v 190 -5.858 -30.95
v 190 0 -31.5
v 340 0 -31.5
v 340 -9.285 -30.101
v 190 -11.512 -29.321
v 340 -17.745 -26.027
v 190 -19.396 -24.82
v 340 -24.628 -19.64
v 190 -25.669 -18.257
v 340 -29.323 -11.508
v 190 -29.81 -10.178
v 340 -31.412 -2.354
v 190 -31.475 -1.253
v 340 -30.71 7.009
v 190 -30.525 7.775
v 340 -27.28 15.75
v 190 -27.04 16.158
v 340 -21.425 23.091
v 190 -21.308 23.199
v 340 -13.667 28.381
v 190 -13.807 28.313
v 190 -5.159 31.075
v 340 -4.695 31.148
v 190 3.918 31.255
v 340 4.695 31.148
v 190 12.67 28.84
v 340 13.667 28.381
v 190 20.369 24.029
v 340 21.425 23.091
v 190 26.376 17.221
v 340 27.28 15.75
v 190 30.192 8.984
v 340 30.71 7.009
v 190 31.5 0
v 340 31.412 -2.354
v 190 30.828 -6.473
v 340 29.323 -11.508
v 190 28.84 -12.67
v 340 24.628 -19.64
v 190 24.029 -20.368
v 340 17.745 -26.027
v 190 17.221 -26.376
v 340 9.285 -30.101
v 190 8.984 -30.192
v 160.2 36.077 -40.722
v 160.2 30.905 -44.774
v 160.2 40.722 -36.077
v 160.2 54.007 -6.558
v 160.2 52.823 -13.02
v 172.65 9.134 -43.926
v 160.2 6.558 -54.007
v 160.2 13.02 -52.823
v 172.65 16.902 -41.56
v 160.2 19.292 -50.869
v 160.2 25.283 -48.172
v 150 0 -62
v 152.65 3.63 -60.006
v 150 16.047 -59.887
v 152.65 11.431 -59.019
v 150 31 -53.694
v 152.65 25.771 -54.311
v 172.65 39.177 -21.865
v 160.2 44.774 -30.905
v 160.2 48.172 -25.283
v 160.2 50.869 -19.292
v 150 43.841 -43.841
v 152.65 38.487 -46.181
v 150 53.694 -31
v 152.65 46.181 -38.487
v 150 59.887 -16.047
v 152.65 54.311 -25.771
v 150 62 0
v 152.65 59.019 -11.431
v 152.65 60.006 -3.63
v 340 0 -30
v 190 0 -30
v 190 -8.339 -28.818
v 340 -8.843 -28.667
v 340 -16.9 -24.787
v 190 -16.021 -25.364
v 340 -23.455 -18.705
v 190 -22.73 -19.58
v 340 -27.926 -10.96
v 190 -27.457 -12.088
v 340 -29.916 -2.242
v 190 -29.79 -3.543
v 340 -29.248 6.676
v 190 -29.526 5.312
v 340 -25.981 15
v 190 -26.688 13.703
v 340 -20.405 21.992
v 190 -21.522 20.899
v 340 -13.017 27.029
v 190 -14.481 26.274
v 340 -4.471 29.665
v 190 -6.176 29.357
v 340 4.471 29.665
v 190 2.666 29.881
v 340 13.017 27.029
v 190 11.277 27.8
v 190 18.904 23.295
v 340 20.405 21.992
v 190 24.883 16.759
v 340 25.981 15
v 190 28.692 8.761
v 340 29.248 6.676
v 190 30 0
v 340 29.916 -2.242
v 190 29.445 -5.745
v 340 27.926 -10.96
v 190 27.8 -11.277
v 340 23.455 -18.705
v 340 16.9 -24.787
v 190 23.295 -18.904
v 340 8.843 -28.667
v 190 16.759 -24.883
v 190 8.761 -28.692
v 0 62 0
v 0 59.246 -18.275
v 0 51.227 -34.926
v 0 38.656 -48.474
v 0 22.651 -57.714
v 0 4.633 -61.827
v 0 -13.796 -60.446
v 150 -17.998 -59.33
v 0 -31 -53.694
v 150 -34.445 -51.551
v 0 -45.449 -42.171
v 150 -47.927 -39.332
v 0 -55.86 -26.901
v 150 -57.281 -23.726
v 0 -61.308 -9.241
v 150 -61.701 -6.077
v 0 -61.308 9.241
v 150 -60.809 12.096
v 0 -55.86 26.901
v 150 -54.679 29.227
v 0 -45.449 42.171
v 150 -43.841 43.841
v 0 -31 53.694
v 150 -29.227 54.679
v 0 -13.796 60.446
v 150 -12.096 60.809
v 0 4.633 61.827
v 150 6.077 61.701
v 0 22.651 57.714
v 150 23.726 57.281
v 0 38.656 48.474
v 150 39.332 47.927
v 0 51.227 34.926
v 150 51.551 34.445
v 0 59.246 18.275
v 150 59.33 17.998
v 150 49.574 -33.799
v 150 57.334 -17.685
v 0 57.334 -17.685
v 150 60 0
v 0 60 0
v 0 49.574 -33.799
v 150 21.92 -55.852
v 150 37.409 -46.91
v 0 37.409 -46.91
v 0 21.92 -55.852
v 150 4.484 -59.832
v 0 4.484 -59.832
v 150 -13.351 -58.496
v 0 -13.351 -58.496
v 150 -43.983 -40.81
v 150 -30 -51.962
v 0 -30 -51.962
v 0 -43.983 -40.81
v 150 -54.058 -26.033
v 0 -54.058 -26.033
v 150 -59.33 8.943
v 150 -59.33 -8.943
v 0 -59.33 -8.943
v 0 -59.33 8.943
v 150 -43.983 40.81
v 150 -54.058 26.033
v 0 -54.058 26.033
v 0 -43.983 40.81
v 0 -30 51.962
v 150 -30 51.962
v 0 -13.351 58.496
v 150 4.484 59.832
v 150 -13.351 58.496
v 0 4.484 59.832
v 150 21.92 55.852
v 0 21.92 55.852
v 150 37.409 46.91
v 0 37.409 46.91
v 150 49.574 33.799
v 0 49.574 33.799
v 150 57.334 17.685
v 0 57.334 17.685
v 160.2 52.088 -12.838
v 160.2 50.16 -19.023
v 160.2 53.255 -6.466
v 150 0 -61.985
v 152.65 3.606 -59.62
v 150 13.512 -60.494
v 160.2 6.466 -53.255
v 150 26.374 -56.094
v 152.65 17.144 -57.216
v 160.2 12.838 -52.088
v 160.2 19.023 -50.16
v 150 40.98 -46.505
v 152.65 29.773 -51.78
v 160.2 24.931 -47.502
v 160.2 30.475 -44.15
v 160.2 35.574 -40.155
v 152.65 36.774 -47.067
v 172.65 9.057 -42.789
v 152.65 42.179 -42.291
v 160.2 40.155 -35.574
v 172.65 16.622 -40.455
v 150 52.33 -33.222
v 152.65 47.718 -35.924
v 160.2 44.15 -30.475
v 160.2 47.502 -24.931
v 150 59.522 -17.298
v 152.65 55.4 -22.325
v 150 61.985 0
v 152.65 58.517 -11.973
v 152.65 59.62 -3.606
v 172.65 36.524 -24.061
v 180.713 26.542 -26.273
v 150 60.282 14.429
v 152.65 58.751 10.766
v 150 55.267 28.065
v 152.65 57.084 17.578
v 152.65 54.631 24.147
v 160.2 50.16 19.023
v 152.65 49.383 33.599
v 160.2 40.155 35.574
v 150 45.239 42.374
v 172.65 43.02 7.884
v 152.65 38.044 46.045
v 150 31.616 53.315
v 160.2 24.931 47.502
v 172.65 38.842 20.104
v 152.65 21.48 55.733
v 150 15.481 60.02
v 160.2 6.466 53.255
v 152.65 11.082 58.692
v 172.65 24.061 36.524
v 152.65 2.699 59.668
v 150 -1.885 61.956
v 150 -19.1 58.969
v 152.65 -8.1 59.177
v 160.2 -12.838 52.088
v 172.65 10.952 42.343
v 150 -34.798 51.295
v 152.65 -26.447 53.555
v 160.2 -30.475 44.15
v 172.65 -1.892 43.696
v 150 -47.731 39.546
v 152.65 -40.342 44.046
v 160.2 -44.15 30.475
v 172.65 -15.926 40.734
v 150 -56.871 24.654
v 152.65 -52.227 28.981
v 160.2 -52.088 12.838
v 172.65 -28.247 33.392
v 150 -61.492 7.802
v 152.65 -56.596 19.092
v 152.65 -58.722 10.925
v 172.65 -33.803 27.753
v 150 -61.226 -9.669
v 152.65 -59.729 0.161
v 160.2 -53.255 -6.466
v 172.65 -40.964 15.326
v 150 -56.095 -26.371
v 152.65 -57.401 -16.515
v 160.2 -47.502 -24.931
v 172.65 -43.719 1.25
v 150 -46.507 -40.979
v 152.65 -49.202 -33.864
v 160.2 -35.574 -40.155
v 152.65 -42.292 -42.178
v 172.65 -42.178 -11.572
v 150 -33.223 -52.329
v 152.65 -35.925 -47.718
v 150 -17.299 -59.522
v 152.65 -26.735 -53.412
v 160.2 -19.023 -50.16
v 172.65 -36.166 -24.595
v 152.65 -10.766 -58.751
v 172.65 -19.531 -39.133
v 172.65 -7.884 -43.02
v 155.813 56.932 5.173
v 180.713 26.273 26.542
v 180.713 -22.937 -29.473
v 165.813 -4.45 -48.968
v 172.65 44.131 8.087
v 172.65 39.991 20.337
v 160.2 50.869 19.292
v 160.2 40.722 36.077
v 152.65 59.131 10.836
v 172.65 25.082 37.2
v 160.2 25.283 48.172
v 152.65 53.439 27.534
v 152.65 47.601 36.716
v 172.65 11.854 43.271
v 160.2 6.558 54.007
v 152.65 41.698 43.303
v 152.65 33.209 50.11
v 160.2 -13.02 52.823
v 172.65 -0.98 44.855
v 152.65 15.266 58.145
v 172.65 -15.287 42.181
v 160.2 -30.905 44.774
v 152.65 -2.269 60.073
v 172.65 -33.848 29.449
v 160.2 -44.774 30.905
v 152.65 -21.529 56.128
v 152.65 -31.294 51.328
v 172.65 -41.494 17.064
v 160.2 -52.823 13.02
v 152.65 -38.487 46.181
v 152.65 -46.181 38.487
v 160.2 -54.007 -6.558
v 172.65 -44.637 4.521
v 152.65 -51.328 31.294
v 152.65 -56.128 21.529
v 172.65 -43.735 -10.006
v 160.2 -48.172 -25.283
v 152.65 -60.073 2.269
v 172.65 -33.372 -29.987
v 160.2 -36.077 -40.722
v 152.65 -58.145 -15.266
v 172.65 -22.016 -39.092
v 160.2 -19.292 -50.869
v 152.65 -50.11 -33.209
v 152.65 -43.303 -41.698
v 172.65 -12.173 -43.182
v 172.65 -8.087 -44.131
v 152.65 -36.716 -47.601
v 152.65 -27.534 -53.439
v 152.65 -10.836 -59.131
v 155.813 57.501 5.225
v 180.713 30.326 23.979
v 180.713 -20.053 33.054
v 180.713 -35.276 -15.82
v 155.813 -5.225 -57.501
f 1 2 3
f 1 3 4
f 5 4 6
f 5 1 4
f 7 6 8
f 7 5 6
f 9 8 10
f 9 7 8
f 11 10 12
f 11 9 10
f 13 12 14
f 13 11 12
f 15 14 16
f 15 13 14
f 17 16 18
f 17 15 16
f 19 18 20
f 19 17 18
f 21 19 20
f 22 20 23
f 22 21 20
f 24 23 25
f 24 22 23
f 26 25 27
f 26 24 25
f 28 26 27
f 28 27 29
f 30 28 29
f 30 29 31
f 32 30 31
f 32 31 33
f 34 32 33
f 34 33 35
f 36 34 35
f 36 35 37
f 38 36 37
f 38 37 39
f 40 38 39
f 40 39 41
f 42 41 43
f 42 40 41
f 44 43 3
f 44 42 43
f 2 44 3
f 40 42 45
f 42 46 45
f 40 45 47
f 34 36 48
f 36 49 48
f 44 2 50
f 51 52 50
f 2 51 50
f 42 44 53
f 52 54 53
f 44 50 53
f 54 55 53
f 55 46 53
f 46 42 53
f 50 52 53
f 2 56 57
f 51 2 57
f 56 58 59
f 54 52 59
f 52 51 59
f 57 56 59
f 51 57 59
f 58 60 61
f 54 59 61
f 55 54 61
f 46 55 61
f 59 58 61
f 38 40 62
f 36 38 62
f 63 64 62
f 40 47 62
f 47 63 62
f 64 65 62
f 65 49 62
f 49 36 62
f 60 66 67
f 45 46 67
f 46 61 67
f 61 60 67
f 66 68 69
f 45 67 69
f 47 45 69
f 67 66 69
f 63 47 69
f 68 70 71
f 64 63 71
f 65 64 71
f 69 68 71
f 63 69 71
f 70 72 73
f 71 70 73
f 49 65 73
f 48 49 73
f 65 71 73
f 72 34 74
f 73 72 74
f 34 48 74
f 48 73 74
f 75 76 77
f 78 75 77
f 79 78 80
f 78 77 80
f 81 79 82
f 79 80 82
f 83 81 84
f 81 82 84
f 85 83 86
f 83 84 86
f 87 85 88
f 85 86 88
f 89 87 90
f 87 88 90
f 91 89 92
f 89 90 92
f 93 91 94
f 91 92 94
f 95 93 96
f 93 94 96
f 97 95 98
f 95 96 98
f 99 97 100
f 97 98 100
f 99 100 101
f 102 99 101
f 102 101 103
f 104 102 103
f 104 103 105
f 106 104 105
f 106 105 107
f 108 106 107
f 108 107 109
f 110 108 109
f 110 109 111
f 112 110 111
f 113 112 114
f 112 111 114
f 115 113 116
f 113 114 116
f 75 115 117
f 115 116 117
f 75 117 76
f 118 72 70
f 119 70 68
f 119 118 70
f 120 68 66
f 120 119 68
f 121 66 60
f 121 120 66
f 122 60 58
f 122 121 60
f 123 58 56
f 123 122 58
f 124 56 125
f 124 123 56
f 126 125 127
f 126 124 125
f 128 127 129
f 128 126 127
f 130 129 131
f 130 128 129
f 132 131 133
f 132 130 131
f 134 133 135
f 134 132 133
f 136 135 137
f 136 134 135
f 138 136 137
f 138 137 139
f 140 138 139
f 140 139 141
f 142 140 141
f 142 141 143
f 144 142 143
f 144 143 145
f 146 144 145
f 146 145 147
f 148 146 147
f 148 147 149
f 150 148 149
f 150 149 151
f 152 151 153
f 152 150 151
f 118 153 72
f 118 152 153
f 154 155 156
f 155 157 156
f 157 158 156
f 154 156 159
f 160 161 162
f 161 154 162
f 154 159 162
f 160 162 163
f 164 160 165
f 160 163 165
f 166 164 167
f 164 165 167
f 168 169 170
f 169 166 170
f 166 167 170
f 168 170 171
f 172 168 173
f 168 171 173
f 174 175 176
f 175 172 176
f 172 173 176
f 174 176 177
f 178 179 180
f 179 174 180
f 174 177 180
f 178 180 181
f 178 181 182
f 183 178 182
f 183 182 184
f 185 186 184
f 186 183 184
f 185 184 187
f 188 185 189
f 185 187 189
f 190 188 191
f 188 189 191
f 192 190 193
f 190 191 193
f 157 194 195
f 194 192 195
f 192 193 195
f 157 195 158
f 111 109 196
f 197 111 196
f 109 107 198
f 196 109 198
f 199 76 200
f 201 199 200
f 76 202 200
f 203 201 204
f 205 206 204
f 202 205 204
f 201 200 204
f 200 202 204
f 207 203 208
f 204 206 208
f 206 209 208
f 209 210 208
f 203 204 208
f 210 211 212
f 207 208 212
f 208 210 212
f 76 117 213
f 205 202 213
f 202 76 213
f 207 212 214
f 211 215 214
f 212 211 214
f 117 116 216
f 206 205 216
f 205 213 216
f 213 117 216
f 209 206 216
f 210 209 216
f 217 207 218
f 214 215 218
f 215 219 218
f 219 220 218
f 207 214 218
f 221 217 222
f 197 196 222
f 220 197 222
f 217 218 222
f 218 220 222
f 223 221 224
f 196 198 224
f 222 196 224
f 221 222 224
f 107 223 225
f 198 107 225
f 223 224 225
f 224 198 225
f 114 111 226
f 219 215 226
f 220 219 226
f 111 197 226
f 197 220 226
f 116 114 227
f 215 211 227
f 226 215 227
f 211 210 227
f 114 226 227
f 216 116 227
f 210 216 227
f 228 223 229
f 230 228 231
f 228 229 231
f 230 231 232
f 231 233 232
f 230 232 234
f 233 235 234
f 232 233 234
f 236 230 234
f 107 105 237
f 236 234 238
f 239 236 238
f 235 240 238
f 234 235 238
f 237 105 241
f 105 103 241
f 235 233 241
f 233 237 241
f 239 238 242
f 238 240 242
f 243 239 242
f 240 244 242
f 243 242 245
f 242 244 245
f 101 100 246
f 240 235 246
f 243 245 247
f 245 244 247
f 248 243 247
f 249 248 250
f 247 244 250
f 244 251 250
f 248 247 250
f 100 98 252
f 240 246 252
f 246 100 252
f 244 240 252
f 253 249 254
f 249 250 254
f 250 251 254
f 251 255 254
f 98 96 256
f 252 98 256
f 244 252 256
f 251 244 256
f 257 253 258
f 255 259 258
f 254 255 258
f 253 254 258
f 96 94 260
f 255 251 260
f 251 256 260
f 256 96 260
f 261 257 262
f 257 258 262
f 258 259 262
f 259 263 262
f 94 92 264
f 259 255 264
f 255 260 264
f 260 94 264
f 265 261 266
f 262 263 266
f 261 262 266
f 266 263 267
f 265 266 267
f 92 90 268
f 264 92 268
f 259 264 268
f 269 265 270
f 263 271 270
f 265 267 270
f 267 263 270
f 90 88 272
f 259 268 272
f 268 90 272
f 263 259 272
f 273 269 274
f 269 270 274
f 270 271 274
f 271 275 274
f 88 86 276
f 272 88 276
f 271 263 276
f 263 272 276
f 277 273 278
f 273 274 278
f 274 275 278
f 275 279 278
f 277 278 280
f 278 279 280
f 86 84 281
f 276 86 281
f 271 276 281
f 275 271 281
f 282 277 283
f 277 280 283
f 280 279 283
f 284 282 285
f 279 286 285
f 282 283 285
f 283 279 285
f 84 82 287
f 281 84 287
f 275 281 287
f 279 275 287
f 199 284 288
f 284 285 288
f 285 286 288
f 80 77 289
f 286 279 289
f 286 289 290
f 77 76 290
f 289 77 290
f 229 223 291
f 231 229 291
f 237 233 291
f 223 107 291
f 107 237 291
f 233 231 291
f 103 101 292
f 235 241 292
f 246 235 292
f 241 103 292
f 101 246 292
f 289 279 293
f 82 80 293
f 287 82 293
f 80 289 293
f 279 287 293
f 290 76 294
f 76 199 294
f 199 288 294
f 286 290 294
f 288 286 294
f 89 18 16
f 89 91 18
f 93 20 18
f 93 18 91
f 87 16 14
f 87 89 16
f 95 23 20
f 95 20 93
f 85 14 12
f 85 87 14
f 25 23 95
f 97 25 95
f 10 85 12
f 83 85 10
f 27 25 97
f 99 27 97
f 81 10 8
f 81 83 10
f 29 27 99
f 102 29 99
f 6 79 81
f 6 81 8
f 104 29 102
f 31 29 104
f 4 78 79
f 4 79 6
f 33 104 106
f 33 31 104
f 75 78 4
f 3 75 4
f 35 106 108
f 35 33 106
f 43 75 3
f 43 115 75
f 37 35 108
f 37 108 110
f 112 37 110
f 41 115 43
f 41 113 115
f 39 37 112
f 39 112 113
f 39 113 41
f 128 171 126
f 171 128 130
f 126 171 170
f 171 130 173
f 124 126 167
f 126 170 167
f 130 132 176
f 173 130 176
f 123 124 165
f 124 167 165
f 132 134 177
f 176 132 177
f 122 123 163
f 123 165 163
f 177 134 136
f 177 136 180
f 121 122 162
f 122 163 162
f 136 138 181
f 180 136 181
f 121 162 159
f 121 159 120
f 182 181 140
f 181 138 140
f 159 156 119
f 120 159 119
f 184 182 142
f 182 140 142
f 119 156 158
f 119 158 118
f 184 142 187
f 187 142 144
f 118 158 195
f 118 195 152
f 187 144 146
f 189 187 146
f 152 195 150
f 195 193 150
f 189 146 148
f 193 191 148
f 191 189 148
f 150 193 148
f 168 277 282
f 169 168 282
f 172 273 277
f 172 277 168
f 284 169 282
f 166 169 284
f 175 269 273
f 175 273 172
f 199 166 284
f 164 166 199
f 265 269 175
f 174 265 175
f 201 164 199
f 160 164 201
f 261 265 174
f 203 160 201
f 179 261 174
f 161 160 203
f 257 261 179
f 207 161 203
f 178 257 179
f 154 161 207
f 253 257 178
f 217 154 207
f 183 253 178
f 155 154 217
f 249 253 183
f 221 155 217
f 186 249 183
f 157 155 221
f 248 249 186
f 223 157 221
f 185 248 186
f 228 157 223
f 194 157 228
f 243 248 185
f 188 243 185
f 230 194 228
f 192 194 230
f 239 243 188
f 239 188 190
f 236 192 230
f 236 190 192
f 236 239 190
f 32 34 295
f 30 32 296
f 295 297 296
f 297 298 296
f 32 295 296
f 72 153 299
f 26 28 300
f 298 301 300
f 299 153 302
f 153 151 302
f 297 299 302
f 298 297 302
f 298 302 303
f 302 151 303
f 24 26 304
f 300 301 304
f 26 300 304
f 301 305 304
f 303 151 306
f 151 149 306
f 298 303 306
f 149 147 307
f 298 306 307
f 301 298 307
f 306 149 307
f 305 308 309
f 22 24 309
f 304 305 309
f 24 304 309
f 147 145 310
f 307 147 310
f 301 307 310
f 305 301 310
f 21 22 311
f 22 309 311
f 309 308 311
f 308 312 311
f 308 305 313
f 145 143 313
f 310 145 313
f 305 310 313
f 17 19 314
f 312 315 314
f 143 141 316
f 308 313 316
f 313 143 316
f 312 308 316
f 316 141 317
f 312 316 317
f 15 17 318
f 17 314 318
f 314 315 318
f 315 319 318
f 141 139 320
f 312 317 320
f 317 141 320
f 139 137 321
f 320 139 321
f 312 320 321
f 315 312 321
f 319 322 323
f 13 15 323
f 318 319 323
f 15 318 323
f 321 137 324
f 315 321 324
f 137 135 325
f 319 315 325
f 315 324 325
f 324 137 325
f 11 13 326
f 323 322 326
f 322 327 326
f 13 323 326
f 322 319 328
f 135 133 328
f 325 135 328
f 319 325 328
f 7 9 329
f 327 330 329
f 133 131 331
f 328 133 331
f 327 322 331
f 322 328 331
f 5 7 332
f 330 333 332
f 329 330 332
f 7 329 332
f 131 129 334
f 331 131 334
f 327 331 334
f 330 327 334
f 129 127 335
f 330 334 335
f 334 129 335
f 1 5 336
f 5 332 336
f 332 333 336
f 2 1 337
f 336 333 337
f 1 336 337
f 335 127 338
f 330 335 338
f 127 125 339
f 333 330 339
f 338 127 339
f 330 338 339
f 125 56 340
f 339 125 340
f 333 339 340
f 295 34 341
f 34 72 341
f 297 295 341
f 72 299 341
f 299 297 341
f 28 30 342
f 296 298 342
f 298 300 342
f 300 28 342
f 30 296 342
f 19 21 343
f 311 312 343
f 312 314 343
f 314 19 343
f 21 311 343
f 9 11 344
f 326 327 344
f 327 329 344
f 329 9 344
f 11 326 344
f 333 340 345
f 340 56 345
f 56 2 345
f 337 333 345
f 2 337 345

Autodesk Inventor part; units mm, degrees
ref_plane "YZ Plane" through (0, 0, 0) normal (1, 0, 0) x (0, 1, 0)
ref_plane "XZ Plane" through (0, 0, 0) normal (0, 1, 0) x (-1, 0, 0)
sketch "Boceto1" plane through (0, 0, 0) normal (1, 0, 0) x (0, 1, 0)
  circle A0 centre (0, 0) radius 60
  circle A1 centre (0, 0) radius 62
  line L0 (0, 0) -> (1013.9731, 0) construction
  dimension "d0" = 120
  dimension "d1" = 124
extrude "Extrusión1" add sketch "Boceto1" along normal blind 150
ref_plane "Plano de trabajo1" through (190, 0, 0) normal (1, 0, 0) x (0, 0, -1)
sketch "Boceto4" plane through (190, 0, 0) normal (1, 0, 0) x (0, 0, -1)
  circle A0 centre (0, 0) radius 30
  circle A1 centre (0, 0) radius 31.5
  dimension "d6" = 60
  dimension "d7" = 63
extrude "Extrusión2" add sketch "Boceto4" along normal blind 150
loft "Solevación1" add section 1 edges at (190, 0, 31.5) section 2 edges at (150, -62, 0) section 3 edges at (190, 0, 30)
properties part number "Tubo tolba" material "PVC, no plastificado"
